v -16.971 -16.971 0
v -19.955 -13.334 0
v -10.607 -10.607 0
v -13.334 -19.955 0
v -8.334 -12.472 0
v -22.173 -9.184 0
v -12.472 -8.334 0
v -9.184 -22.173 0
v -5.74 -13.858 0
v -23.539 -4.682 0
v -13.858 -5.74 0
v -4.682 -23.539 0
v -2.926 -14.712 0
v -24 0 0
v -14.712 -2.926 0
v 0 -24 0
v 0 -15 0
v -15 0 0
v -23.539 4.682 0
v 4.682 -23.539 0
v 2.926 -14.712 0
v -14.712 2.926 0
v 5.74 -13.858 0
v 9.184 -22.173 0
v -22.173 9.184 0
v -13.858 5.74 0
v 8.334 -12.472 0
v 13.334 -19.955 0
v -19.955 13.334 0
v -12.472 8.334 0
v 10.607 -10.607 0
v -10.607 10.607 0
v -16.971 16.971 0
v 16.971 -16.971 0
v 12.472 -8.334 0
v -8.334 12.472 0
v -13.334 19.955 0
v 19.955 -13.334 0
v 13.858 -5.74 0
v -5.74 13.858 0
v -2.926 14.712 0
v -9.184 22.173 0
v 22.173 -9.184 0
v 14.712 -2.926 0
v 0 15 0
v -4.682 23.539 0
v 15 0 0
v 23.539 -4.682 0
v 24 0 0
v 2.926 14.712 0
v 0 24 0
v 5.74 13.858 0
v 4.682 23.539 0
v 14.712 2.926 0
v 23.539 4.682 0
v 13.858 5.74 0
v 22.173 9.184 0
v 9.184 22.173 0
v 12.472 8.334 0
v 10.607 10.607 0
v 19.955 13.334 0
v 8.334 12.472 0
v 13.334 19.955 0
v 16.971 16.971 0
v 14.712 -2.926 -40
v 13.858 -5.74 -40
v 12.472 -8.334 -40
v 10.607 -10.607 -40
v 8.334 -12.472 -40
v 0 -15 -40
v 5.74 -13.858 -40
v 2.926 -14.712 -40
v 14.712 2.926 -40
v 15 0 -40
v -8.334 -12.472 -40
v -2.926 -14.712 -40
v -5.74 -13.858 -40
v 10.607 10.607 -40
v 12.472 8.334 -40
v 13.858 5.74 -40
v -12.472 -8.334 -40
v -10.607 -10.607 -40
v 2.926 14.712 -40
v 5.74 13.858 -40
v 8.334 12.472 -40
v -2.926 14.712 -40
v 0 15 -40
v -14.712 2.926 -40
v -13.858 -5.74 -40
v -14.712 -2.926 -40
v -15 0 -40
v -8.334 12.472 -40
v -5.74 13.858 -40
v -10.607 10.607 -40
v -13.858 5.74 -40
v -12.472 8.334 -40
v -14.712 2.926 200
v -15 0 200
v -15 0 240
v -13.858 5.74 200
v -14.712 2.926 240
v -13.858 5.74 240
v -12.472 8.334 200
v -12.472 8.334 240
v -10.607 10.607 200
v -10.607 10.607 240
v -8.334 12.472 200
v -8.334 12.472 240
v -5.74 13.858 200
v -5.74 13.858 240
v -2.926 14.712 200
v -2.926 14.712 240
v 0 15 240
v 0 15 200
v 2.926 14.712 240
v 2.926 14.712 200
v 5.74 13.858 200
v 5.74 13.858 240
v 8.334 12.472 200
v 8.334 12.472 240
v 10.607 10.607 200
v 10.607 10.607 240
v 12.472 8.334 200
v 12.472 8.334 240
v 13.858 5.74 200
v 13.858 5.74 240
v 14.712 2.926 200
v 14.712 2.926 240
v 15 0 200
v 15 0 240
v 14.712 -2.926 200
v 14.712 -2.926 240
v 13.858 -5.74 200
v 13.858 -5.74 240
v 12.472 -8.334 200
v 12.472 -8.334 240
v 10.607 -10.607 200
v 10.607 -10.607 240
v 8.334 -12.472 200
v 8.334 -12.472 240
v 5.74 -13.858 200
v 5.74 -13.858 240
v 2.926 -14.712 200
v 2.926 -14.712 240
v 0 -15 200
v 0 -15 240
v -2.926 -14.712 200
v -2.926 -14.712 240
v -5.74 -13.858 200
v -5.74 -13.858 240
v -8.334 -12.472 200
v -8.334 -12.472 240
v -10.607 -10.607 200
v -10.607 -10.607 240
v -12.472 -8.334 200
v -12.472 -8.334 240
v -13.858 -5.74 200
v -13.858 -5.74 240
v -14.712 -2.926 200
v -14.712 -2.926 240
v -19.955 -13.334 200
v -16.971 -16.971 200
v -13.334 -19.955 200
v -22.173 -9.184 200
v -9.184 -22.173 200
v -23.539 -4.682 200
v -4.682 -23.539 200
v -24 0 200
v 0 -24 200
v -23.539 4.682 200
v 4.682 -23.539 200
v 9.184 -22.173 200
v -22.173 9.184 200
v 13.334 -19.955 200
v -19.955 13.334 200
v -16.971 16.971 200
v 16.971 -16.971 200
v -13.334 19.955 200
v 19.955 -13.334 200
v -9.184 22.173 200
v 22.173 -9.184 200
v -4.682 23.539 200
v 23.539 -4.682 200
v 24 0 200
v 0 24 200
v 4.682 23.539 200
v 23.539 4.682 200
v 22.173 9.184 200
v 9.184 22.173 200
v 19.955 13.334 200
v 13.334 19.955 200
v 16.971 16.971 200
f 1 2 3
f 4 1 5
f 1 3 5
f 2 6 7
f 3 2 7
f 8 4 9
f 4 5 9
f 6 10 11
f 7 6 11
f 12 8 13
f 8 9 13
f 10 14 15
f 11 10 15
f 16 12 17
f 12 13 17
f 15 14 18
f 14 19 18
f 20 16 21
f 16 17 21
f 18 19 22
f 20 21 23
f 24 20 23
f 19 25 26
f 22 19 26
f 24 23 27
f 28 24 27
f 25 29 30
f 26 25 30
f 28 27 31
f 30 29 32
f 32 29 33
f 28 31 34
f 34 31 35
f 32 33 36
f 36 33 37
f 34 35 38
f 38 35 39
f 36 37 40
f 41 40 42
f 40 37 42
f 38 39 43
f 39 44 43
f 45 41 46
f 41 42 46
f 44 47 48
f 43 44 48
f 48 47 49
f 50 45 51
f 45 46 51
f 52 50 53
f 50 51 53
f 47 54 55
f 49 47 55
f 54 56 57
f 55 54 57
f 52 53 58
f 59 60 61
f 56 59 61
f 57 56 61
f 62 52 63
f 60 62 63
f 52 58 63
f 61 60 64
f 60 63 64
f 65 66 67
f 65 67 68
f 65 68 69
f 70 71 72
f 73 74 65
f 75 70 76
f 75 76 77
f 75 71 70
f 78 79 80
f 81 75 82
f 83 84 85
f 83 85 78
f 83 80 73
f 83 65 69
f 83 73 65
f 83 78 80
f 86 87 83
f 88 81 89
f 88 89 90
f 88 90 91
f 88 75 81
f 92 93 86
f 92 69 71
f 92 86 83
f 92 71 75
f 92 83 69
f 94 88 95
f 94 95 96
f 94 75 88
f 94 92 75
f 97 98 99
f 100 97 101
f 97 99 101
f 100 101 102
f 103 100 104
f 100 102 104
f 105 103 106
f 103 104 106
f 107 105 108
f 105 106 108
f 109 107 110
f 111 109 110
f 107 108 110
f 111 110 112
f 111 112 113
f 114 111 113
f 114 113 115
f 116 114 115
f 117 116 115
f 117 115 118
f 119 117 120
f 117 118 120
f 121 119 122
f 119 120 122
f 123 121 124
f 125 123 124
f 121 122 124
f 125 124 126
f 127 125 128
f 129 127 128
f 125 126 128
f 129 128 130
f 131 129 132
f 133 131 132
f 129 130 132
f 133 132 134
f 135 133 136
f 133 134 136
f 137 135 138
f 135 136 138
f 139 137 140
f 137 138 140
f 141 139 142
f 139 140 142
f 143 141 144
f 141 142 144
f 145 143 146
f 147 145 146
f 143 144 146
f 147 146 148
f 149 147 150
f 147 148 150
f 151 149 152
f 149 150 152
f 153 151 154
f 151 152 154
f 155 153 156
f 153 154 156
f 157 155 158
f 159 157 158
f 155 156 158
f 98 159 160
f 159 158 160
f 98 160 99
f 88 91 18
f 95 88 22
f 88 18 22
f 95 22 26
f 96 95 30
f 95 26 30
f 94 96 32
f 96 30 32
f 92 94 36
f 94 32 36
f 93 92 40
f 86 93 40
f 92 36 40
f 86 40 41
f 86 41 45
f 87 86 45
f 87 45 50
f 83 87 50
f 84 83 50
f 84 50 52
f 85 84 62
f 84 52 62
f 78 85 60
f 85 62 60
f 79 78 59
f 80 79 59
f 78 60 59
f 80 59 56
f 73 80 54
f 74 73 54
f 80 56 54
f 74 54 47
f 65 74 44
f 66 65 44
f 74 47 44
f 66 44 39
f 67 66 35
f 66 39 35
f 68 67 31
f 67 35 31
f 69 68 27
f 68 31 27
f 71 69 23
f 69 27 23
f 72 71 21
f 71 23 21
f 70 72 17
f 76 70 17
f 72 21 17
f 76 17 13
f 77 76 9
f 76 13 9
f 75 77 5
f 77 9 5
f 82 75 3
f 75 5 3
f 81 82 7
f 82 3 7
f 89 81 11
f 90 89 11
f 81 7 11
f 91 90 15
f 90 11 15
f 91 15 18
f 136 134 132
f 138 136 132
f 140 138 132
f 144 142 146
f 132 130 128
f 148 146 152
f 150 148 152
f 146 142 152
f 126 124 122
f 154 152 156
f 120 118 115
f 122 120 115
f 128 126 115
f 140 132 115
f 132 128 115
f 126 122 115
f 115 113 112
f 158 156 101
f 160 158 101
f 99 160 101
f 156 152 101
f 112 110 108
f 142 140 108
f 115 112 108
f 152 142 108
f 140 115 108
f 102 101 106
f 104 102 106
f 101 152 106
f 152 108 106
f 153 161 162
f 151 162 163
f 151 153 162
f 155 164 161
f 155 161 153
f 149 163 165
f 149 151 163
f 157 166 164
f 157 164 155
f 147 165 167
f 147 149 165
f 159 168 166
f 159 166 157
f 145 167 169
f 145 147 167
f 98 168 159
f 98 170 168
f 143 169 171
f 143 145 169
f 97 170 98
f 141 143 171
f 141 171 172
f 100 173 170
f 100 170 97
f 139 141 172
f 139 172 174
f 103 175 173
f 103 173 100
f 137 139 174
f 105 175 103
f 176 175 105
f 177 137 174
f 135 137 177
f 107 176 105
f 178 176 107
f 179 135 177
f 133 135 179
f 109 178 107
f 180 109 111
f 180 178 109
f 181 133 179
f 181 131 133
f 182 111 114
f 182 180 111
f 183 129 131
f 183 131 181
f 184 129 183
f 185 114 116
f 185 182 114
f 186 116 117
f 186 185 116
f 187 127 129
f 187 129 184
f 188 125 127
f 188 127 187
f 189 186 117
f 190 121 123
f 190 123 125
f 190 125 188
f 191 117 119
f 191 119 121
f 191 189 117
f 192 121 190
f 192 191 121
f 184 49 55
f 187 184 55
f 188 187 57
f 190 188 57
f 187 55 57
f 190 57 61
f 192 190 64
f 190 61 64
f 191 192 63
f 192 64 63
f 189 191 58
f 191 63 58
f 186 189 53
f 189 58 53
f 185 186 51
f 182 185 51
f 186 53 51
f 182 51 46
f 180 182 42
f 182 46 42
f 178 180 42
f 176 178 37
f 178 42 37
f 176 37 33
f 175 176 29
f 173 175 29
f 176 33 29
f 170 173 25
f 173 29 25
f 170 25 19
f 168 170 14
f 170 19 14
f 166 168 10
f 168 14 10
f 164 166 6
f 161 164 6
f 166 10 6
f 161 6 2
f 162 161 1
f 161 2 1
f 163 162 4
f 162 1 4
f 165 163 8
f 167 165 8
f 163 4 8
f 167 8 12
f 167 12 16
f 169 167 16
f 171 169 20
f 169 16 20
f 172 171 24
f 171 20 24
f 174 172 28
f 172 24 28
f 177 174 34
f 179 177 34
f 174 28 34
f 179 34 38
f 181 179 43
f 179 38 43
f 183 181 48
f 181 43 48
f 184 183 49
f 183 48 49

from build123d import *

# Parameters (mm, degrees)
SKETCH1_R           = 24
BOSS_EXTRUDE1_DEPTH = 200
SKETCH2_R           = 15
BOSS_EXTRUDE2_DEPTH = 40
LPATTERN1_COUNT     = 2
LPATTERN1_PITCH     = 240


with BuildPart() as part:
    # Sketch1 → Boss-Extrude1 (new body)
    with BuildSketch(Plane.XY):
        Circle(SKETCH1_R)
    extrude(amount=BOSS_EXTRUDE1_DEPTH)

    # Sketch2 → Boss-Extrude2 (add)
    with BuildSketch(Plane(origin=(0, 0, 0), x_dir=(-1, 0, 0), z_dir=(0, 0, -1))):
        Circle(SKETCH2_R)
    boss_extrude2 = extrude(amount=BOSS_EXTRUDE2_DEPTH)

    # LPattern1: Boss-Extrude2 ×2
    with Locations(*[(0, 0, i * LPATTERN1_PITCH) for i in range(1, LPATTERN1_COUNT)]):
        add(boss_extrude2)


solid = part.part
